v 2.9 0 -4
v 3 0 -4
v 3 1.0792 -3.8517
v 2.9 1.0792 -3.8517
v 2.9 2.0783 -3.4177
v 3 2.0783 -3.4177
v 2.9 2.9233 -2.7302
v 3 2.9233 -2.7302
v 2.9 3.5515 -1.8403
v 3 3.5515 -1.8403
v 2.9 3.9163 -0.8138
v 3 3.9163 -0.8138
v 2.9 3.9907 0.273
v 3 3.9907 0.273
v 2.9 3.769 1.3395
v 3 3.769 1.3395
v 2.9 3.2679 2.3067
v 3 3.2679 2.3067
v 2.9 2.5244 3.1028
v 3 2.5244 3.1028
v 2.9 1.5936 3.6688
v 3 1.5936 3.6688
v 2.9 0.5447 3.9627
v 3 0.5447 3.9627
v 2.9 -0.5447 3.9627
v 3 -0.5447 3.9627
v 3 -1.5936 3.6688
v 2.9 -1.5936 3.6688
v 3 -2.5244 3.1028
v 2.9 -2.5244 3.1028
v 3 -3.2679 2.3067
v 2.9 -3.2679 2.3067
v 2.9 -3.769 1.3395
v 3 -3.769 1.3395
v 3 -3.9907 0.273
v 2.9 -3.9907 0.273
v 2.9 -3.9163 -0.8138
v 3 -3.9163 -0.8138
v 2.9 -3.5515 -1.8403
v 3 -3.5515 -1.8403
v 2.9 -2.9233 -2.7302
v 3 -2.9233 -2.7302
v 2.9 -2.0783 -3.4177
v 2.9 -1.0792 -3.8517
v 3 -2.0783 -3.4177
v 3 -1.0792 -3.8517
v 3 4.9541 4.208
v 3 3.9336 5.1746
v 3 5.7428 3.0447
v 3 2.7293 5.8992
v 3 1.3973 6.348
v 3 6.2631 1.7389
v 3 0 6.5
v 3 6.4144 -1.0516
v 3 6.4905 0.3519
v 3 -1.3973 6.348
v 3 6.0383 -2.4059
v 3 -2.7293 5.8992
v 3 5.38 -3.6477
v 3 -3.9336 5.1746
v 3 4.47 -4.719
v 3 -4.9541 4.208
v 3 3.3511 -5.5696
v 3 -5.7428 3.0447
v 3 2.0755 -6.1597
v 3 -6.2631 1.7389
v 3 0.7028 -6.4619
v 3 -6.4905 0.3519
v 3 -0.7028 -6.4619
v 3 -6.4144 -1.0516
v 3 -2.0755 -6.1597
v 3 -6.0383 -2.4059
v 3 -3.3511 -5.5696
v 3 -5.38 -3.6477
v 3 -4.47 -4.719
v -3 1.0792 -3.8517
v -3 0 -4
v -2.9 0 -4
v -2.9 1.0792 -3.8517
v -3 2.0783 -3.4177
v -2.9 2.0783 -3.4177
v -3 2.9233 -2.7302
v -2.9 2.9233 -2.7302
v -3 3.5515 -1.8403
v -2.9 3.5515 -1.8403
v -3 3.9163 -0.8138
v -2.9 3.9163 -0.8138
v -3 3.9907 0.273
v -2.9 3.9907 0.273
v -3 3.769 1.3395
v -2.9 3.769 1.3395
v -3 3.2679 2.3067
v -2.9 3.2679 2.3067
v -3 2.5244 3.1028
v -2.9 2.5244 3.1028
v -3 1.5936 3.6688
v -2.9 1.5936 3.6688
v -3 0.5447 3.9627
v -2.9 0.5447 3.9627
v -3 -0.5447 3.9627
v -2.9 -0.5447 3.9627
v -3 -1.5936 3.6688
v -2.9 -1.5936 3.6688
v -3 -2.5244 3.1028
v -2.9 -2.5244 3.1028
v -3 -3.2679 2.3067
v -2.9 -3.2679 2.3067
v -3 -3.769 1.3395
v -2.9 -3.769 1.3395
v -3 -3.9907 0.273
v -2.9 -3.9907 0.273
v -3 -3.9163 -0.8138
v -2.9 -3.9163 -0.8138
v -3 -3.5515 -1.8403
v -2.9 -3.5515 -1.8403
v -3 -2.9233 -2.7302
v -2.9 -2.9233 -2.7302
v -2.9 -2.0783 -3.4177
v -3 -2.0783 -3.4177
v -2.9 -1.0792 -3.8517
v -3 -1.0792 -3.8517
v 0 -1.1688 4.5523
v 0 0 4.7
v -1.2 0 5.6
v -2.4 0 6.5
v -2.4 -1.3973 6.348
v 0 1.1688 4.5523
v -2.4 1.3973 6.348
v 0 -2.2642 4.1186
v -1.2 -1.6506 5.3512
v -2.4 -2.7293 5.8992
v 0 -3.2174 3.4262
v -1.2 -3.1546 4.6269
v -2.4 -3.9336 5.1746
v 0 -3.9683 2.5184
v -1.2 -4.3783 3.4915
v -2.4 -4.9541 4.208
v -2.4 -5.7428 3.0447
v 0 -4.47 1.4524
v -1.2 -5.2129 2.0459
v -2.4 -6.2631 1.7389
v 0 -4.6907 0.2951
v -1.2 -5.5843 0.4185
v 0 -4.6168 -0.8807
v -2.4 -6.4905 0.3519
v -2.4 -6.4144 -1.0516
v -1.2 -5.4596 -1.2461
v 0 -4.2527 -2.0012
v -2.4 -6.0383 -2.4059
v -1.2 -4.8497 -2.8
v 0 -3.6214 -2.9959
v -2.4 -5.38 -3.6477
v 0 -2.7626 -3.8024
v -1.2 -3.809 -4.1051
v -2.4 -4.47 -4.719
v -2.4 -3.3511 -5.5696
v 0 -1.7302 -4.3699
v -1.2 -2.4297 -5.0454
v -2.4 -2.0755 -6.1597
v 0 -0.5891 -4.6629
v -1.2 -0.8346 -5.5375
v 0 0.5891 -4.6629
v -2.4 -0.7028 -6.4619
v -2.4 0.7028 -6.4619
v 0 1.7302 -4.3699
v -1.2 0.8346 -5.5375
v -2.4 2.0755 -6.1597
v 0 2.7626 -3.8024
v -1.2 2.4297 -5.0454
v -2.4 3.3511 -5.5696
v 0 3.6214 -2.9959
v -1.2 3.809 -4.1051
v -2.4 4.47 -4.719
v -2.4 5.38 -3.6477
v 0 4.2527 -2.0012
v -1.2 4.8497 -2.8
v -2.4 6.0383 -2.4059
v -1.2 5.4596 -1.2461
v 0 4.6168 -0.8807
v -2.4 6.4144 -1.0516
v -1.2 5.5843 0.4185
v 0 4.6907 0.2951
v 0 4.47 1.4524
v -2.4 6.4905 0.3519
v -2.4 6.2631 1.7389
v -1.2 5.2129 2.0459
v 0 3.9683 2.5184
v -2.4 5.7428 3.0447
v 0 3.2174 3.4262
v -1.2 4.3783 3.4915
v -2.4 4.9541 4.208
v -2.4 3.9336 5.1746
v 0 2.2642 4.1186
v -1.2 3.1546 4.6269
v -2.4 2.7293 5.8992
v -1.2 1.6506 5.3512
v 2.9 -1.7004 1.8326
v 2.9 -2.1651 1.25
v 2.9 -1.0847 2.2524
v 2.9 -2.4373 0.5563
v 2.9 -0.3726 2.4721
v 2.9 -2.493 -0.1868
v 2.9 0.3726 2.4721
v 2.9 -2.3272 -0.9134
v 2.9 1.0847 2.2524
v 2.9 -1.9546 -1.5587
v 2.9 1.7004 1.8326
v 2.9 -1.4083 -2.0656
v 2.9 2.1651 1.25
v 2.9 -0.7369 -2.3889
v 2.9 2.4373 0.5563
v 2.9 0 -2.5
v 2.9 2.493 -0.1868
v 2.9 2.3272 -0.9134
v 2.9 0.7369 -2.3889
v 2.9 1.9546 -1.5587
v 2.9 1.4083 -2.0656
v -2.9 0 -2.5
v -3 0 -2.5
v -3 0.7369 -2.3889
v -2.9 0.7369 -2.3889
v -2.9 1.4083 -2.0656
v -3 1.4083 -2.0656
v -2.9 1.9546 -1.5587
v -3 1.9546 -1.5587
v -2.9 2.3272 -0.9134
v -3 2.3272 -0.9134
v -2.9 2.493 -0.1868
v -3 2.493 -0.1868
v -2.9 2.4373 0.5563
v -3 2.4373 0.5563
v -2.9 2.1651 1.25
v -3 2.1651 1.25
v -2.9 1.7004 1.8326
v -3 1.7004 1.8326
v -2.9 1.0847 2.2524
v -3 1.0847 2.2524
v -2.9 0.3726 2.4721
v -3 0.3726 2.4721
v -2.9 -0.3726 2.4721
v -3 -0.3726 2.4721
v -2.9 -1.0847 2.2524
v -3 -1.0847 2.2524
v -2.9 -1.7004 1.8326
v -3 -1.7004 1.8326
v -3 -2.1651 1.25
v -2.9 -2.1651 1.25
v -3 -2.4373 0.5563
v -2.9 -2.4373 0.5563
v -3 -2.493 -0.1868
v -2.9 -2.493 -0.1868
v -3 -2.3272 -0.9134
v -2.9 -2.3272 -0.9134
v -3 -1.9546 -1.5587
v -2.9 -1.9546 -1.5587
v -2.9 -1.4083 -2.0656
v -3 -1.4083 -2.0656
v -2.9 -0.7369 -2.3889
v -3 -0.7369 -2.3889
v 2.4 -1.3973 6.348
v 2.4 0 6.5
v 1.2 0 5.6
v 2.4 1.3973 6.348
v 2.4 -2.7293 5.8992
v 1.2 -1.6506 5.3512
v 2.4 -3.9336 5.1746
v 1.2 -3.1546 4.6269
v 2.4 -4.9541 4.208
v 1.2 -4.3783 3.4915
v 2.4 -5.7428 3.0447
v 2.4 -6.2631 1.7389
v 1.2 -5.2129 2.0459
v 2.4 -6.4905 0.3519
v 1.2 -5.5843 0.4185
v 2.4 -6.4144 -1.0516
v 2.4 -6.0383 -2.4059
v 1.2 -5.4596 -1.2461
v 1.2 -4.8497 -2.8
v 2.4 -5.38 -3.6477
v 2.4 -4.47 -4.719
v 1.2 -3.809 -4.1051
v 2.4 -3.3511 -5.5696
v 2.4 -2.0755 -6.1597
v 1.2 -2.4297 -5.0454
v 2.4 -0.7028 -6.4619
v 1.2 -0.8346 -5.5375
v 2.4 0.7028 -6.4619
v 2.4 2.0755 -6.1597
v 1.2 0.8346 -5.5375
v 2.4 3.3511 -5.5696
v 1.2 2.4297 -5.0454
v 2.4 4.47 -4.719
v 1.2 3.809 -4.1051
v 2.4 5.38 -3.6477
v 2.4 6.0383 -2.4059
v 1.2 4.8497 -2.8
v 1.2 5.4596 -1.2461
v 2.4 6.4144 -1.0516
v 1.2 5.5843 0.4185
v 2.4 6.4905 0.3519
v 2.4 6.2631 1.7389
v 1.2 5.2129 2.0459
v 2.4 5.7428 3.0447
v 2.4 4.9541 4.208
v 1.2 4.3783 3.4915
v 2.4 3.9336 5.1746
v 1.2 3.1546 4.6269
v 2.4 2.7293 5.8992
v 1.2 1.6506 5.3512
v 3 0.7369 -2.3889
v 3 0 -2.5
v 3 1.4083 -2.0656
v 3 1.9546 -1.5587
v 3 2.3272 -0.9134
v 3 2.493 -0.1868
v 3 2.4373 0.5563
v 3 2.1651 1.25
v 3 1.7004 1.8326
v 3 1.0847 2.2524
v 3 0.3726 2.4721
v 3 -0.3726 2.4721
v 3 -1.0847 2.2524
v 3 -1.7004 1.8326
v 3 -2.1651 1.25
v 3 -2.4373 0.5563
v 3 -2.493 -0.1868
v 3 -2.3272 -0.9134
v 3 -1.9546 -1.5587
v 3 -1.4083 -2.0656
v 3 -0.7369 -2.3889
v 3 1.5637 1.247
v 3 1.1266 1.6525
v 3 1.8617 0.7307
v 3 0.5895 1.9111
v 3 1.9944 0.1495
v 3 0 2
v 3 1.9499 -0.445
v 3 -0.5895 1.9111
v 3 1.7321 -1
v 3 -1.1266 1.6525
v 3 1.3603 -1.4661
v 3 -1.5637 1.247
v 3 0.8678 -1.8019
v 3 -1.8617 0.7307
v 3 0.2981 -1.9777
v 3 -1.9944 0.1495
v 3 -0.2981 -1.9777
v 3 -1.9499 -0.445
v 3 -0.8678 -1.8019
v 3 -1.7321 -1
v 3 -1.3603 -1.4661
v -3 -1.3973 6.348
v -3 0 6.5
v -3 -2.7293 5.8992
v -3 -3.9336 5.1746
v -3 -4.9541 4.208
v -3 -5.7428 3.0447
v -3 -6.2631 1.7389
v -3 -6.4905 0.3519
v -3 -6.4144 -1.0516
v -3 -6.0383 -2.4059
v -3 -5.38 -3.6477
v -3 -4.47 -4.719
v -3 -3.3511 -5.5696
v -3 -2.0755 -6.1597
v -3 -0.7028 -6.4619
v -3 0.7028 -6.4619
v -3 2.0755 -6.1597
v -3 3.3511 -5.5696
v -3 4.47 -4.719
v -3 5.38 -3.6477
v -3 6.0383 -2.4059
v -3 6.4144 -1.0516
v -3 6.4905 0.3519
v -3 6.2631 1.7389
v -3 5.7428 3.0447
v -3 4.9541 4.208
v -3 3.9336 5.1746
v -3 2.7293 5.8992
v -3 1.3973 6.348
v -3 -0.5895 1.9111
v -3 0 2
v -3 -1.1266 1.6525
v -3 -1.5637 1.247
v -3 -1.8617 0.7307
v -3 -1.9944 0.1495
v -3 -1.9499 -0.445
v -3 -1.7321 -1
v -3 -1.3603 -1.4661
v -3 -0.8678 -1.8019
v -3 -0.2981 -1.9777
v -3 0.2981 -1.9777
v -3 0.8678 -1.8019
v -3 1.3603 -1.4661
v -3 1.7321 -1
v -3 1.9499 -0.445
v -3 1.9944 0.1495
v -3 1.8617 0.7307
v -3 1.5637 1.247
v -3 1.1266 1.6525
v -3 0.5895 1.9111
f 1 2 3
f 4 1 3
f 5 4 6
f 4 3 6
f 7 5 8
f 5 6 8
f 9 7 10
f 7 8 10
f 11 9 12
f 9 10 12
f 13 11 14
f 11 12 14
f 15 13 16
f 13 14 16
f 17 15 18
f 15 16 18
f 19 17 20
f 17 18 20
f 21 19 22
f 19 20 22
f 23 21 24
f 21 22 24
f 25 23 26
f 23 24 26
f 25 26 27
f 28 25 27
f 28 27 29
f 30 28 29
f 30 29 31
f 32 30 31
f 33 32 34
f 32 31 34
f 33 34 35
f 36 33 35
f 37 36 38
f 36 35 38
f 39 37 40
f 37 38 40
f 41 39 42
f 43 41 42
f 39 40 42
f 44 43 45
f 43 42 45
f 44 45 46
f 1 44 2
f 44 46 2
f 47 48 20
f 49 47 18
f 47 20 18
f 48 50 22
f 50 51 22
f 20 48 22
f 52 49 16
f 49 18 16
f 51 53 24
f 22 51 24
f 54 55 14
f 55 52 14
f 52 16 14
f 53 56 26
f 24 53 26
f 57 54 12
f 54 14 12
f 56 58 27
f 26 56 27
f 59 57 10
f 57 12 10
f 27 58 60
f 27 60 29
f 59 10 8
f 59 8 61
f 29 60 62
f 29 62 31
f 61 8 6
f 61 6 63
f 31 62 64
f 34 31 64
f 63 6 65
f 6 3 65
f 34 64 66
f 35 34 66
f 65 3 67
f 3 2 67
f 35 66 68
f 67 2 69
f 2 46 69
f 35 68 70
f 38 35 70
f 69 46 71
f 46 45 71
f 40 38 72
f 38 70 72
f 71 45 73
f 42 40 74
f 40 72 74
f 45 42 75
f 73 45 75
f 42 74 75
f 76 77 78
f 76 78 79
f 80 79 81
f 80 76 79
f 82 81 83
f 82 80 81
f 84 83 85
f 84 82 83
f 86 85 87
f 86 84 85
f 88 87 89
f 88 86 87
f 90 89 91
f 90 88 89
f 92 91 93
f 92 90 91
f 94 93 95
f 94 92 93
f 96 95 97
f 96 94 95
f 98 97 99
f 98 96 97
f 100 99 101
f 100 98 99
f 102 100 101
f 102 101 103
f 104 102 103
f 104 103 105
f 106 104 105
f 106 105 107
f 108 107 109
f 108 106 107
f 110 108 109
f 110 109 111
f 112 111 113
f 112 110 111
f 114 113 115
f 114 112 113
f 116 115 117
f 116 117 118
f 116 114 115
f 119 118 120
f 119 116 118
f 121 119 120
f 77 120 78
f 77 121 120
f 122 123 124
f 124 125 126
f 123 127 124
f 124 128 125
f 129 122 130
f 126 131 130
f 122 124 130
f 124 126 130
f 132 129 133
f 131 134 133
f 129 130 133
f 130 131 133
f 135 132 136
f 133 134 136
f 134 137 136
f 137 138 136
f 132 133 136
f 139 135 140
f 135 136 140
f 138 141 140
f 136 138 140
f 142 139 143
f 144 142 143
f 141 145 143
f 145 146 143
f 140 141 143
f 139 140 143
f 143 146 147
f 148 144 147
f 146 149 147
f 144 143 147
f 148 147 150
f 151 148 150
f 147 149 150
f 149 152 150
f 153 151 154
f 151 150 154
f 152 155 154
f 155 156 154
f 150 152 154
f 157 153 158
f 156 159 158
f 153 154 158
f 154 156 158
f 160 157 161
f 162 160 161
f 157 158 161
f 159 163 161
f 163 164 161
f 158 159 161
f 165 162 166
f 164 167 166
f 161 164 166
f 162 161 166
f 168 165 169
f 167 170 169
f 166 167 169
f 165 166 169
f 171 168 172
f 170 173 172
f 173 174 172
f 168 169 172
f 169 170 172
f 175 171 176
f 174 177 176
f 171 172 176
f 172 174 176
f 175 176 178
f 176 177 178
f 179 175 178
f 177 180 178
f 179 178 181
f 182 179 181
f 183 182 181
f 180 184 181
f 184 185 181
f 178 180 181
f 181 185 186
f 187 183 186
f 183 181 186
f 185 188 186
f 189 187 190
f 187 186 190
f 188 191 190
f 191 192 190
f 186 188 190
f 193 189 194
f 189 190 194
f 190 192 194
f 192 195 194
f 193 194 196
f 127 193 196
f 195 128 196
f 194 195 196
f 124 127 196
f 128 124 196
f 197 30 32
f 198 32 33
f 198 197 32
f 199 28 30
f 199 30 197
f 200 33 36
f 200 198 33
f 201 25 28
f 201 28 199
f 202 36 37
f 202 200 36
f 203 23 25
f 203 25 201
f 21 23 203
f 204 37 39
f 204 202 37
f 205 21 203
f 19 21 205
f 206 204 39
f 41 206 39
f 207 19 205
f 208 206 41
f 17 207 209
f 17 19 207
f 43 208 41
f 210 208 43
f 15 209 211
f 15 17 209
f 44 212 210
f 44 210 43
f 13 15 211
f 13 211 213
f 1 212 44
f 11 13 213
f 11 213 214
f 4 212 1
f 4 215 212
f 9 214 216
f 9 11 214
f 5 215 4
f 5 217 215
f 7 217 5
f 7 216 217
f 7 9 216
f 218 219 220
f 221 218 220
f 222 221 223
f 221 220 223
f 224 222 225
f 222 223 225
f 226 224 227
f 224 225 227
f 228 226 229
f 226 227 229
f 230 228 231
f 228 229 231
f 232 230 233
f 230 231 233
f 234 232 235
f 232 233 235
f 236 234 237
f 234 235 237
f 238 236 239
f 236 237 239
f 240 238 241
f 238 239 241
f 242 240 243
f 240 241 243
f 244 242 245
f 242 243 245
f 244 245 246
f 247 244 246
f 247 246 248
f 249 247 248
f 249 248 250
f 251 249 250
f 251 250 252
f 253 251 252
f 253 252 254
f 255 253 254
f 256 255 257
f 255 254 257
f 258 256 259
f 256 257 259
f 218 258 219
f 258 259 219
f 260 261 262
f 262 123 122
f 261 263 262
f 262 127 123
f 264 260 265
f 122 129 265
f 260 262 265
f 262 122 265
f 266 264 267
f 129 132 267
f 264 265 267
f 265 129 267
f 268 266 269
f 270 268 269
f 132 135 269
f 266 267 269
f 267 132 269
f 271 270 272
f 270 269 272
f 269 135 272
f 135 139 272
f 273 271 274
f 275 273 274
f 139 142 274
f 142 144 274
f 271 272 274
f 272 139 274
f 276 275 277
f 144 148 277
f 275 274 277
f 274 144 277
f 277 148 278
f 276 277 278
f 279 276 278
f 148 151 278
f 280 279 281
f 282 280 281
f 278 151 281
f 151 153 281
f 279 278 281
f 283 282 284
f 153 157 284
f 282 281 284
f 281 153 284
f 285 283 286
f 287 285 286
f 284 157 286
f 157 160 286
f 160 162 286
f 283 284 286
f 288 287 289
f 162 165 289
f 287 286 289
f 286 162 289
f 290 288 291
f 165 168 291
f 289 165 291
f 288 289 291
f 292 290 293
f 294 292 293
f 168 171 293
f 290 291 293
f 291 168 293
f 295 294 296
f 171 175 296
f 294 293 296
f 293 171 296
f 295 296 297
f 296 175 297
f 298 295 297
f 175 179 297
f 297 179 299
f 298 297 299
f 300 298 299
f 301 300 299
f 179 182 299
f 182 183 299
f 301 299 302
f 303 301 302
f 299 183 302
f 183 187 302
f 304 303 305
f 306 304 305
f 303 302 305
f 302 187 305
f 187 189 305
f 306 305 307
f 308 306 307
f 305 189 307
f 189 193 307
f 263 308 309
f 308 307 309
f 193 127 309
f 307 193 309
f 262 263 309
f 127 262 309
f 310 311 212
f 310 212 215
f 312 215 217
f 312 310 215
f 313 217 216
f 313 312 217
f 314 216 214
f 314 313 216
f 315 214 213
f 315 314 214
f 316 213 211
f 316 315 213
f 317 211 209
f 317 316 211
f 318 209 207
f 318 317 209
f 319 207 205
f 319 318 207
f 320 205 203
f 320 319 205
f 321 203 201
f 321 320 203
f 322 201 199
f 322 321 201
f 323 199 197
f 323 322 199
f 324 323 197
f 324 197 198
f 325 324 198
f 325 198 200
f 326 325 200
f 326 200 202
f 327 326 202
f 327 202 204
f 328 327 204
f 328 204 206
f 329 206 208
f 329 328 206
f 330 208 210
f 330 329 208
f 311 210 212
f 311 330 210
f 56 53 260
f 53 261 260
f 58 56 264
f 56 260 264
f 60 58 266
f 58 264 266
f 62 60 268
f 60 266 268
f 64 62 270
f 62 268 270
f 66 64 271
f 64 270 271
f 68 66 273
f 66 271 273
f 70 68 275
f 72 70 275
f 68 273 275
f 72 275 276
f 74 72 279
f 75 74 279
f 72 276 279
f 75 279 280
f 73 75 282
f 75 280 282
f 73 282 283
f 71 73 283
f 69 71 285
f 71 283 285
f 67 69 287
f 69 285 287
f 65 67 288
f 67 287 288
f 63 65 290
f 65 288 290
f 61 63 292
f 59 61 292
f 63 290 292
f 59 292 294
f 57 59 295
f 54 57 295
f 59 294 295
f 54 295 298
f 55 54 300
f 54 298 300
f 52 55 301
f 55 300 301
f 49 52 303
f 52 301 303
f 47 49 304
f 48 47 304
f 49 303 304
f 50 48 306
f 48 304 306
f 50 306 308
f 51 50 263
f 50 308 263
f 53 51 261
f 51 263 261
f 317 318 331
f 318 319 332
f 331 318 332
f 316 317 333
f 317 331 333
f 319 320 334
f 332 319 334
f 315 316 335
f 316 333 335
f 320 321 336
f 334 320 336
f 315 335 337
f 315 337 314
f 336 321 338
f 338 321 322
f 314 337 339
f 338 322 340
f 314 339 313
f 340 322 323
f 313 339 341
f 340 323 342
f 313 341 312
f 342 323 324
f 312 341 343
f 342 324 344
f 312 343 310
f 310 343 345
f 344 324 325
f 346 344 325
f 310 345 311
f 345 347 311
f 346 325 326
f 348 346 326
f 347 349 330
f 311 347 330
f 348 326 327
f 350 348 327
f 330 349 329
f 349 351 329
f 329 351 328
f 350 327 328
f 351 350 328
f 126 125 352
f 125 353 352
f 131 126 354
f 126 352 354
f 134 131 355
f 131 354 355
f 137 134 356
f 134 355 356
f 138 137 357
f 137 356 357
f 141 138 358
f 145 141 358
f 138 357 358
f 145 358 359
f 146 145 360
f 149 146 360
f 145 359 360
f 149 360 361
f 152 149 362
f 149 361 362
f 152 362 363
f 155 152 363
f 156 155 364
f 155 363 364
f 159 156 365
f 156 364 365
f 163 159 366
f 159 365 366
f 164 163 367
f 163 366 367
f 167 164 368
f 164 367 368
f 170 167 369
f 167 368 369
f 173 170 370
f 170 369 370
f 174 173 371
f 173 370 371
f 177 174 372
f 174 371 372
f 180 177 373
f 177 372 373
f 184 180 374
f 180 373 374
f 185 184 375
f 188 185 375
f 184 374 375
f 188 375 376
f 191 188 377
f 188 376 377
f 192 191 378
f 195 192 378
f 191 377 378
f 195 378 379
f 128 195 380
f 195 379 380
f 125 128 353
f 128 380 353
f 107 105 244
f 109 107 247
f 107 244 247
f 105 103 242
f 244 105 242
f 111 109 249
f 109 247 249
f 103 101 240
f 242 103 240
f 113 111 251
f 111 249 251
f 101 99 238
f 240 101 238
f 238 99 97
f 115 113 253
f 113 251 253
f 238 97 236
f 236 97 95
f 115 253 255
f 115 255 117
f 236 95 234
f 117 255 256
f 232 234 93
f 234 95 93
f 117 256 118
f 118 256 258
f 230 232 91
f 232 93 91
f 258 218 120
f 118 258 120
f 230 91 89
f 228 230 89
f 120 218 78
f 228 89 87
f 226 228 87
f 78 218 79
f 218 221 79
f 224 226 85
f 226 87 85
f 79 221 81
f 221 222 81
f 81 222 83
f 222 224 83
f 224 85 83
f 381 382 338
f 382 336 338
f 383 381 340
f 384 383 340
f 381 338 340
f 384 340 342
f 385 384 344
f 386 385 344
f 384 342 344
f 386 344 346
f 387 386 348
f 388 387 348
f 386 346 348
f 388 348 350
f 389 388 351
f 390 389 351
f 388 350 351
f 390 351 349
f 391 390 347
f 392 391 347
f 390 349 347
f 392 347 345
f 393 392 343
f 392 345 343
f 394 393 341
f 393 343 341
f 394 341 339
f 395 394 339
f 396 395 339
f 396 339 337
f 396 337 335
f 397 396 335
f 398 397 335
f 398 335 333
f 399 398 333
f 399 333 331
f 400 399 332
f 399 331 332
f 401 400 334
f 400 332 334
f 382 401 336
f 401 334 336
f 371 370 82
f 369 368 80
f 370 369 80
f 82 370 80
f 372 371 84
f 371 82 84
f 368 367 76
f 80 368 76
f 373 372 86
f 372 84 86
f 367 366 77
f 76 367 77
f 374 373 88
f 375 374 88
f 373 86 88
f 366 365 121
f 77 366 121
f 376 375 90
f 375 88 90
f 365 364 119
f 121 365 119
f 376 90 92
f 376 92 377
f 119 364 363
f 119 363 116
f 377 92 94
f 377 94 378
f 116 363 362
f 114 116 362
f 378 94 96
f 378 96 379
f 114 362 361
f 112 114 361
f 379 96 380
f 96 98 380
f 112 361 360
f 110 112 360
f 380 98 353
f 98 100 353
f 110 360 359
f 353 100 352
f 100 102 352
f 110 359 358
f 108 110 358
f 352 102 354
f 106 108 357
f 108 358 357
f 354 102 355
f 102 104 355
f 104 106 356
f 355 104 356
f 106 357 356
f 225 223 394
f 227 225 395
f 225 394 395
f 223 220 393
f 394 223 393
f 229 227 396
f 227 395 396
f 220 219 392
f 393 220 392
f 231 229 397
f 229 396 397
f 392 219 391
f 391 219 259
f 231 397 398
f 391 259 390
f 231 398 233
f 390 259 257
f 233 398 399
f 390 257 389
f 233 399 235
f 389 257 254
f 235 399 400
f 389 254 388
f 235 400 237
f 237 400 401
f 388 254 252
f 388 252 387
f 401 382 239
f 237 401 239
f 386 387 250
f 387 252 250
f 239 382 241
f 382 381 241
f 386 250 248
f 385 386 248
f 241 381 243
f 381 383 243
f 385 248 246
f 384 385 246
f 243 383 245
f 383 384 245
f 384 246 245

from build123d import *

# Parameters (mm, degrees)
SKETCH2_R          = 4
SKETCH2_R_2        = 2.5
CUT_EXTRUDE1_DEPTH = 0.1


with BuildPart() as part:
    # Sketch1 → Revolve1 (revolve)
    with BuildSketch(Plane.XY, mode=Mode.PRIVATE) as revolve1_sk:
        Polygon((-3, 2), (3, 2), (3, 6.5), (2.4, 6.5), (0, 4.7), (-2.4, 6.5), (-3, 6.5), align=None)
    revolve(revolve1_sk.sketch.rotate(Axis((0, 0, 0), (1, 0, 0)), 90), axis=Axis((0, 0, 0), (1, 0, 0)))

    # Sketch2 → Cut-Extrude1 (cut)
    with BuildSketch(Plane(origin=(3, 0, 0), x_dir=(0, 0, -1), z_dir=(1, 0, 0))):
        Circle(SKETCH2_R)
        Circle(SKETCH2_R_2, mode=Mode.SUBTRACT)
    cut_extrude1 = extrude(amount=-CUT_EXTRUDE1_DEPTH, mode=Mode.SUBTRACT)

    # Mirror1: Cut-Extrude1 across plane
    add(cut_extrude1.mirror(Plane(origin=(0, 0, 0), x_dir=(0, 0, 1), z_dir=(1, 0, 0))), mode=Mode.SUBTRACT)


solid = part.part
